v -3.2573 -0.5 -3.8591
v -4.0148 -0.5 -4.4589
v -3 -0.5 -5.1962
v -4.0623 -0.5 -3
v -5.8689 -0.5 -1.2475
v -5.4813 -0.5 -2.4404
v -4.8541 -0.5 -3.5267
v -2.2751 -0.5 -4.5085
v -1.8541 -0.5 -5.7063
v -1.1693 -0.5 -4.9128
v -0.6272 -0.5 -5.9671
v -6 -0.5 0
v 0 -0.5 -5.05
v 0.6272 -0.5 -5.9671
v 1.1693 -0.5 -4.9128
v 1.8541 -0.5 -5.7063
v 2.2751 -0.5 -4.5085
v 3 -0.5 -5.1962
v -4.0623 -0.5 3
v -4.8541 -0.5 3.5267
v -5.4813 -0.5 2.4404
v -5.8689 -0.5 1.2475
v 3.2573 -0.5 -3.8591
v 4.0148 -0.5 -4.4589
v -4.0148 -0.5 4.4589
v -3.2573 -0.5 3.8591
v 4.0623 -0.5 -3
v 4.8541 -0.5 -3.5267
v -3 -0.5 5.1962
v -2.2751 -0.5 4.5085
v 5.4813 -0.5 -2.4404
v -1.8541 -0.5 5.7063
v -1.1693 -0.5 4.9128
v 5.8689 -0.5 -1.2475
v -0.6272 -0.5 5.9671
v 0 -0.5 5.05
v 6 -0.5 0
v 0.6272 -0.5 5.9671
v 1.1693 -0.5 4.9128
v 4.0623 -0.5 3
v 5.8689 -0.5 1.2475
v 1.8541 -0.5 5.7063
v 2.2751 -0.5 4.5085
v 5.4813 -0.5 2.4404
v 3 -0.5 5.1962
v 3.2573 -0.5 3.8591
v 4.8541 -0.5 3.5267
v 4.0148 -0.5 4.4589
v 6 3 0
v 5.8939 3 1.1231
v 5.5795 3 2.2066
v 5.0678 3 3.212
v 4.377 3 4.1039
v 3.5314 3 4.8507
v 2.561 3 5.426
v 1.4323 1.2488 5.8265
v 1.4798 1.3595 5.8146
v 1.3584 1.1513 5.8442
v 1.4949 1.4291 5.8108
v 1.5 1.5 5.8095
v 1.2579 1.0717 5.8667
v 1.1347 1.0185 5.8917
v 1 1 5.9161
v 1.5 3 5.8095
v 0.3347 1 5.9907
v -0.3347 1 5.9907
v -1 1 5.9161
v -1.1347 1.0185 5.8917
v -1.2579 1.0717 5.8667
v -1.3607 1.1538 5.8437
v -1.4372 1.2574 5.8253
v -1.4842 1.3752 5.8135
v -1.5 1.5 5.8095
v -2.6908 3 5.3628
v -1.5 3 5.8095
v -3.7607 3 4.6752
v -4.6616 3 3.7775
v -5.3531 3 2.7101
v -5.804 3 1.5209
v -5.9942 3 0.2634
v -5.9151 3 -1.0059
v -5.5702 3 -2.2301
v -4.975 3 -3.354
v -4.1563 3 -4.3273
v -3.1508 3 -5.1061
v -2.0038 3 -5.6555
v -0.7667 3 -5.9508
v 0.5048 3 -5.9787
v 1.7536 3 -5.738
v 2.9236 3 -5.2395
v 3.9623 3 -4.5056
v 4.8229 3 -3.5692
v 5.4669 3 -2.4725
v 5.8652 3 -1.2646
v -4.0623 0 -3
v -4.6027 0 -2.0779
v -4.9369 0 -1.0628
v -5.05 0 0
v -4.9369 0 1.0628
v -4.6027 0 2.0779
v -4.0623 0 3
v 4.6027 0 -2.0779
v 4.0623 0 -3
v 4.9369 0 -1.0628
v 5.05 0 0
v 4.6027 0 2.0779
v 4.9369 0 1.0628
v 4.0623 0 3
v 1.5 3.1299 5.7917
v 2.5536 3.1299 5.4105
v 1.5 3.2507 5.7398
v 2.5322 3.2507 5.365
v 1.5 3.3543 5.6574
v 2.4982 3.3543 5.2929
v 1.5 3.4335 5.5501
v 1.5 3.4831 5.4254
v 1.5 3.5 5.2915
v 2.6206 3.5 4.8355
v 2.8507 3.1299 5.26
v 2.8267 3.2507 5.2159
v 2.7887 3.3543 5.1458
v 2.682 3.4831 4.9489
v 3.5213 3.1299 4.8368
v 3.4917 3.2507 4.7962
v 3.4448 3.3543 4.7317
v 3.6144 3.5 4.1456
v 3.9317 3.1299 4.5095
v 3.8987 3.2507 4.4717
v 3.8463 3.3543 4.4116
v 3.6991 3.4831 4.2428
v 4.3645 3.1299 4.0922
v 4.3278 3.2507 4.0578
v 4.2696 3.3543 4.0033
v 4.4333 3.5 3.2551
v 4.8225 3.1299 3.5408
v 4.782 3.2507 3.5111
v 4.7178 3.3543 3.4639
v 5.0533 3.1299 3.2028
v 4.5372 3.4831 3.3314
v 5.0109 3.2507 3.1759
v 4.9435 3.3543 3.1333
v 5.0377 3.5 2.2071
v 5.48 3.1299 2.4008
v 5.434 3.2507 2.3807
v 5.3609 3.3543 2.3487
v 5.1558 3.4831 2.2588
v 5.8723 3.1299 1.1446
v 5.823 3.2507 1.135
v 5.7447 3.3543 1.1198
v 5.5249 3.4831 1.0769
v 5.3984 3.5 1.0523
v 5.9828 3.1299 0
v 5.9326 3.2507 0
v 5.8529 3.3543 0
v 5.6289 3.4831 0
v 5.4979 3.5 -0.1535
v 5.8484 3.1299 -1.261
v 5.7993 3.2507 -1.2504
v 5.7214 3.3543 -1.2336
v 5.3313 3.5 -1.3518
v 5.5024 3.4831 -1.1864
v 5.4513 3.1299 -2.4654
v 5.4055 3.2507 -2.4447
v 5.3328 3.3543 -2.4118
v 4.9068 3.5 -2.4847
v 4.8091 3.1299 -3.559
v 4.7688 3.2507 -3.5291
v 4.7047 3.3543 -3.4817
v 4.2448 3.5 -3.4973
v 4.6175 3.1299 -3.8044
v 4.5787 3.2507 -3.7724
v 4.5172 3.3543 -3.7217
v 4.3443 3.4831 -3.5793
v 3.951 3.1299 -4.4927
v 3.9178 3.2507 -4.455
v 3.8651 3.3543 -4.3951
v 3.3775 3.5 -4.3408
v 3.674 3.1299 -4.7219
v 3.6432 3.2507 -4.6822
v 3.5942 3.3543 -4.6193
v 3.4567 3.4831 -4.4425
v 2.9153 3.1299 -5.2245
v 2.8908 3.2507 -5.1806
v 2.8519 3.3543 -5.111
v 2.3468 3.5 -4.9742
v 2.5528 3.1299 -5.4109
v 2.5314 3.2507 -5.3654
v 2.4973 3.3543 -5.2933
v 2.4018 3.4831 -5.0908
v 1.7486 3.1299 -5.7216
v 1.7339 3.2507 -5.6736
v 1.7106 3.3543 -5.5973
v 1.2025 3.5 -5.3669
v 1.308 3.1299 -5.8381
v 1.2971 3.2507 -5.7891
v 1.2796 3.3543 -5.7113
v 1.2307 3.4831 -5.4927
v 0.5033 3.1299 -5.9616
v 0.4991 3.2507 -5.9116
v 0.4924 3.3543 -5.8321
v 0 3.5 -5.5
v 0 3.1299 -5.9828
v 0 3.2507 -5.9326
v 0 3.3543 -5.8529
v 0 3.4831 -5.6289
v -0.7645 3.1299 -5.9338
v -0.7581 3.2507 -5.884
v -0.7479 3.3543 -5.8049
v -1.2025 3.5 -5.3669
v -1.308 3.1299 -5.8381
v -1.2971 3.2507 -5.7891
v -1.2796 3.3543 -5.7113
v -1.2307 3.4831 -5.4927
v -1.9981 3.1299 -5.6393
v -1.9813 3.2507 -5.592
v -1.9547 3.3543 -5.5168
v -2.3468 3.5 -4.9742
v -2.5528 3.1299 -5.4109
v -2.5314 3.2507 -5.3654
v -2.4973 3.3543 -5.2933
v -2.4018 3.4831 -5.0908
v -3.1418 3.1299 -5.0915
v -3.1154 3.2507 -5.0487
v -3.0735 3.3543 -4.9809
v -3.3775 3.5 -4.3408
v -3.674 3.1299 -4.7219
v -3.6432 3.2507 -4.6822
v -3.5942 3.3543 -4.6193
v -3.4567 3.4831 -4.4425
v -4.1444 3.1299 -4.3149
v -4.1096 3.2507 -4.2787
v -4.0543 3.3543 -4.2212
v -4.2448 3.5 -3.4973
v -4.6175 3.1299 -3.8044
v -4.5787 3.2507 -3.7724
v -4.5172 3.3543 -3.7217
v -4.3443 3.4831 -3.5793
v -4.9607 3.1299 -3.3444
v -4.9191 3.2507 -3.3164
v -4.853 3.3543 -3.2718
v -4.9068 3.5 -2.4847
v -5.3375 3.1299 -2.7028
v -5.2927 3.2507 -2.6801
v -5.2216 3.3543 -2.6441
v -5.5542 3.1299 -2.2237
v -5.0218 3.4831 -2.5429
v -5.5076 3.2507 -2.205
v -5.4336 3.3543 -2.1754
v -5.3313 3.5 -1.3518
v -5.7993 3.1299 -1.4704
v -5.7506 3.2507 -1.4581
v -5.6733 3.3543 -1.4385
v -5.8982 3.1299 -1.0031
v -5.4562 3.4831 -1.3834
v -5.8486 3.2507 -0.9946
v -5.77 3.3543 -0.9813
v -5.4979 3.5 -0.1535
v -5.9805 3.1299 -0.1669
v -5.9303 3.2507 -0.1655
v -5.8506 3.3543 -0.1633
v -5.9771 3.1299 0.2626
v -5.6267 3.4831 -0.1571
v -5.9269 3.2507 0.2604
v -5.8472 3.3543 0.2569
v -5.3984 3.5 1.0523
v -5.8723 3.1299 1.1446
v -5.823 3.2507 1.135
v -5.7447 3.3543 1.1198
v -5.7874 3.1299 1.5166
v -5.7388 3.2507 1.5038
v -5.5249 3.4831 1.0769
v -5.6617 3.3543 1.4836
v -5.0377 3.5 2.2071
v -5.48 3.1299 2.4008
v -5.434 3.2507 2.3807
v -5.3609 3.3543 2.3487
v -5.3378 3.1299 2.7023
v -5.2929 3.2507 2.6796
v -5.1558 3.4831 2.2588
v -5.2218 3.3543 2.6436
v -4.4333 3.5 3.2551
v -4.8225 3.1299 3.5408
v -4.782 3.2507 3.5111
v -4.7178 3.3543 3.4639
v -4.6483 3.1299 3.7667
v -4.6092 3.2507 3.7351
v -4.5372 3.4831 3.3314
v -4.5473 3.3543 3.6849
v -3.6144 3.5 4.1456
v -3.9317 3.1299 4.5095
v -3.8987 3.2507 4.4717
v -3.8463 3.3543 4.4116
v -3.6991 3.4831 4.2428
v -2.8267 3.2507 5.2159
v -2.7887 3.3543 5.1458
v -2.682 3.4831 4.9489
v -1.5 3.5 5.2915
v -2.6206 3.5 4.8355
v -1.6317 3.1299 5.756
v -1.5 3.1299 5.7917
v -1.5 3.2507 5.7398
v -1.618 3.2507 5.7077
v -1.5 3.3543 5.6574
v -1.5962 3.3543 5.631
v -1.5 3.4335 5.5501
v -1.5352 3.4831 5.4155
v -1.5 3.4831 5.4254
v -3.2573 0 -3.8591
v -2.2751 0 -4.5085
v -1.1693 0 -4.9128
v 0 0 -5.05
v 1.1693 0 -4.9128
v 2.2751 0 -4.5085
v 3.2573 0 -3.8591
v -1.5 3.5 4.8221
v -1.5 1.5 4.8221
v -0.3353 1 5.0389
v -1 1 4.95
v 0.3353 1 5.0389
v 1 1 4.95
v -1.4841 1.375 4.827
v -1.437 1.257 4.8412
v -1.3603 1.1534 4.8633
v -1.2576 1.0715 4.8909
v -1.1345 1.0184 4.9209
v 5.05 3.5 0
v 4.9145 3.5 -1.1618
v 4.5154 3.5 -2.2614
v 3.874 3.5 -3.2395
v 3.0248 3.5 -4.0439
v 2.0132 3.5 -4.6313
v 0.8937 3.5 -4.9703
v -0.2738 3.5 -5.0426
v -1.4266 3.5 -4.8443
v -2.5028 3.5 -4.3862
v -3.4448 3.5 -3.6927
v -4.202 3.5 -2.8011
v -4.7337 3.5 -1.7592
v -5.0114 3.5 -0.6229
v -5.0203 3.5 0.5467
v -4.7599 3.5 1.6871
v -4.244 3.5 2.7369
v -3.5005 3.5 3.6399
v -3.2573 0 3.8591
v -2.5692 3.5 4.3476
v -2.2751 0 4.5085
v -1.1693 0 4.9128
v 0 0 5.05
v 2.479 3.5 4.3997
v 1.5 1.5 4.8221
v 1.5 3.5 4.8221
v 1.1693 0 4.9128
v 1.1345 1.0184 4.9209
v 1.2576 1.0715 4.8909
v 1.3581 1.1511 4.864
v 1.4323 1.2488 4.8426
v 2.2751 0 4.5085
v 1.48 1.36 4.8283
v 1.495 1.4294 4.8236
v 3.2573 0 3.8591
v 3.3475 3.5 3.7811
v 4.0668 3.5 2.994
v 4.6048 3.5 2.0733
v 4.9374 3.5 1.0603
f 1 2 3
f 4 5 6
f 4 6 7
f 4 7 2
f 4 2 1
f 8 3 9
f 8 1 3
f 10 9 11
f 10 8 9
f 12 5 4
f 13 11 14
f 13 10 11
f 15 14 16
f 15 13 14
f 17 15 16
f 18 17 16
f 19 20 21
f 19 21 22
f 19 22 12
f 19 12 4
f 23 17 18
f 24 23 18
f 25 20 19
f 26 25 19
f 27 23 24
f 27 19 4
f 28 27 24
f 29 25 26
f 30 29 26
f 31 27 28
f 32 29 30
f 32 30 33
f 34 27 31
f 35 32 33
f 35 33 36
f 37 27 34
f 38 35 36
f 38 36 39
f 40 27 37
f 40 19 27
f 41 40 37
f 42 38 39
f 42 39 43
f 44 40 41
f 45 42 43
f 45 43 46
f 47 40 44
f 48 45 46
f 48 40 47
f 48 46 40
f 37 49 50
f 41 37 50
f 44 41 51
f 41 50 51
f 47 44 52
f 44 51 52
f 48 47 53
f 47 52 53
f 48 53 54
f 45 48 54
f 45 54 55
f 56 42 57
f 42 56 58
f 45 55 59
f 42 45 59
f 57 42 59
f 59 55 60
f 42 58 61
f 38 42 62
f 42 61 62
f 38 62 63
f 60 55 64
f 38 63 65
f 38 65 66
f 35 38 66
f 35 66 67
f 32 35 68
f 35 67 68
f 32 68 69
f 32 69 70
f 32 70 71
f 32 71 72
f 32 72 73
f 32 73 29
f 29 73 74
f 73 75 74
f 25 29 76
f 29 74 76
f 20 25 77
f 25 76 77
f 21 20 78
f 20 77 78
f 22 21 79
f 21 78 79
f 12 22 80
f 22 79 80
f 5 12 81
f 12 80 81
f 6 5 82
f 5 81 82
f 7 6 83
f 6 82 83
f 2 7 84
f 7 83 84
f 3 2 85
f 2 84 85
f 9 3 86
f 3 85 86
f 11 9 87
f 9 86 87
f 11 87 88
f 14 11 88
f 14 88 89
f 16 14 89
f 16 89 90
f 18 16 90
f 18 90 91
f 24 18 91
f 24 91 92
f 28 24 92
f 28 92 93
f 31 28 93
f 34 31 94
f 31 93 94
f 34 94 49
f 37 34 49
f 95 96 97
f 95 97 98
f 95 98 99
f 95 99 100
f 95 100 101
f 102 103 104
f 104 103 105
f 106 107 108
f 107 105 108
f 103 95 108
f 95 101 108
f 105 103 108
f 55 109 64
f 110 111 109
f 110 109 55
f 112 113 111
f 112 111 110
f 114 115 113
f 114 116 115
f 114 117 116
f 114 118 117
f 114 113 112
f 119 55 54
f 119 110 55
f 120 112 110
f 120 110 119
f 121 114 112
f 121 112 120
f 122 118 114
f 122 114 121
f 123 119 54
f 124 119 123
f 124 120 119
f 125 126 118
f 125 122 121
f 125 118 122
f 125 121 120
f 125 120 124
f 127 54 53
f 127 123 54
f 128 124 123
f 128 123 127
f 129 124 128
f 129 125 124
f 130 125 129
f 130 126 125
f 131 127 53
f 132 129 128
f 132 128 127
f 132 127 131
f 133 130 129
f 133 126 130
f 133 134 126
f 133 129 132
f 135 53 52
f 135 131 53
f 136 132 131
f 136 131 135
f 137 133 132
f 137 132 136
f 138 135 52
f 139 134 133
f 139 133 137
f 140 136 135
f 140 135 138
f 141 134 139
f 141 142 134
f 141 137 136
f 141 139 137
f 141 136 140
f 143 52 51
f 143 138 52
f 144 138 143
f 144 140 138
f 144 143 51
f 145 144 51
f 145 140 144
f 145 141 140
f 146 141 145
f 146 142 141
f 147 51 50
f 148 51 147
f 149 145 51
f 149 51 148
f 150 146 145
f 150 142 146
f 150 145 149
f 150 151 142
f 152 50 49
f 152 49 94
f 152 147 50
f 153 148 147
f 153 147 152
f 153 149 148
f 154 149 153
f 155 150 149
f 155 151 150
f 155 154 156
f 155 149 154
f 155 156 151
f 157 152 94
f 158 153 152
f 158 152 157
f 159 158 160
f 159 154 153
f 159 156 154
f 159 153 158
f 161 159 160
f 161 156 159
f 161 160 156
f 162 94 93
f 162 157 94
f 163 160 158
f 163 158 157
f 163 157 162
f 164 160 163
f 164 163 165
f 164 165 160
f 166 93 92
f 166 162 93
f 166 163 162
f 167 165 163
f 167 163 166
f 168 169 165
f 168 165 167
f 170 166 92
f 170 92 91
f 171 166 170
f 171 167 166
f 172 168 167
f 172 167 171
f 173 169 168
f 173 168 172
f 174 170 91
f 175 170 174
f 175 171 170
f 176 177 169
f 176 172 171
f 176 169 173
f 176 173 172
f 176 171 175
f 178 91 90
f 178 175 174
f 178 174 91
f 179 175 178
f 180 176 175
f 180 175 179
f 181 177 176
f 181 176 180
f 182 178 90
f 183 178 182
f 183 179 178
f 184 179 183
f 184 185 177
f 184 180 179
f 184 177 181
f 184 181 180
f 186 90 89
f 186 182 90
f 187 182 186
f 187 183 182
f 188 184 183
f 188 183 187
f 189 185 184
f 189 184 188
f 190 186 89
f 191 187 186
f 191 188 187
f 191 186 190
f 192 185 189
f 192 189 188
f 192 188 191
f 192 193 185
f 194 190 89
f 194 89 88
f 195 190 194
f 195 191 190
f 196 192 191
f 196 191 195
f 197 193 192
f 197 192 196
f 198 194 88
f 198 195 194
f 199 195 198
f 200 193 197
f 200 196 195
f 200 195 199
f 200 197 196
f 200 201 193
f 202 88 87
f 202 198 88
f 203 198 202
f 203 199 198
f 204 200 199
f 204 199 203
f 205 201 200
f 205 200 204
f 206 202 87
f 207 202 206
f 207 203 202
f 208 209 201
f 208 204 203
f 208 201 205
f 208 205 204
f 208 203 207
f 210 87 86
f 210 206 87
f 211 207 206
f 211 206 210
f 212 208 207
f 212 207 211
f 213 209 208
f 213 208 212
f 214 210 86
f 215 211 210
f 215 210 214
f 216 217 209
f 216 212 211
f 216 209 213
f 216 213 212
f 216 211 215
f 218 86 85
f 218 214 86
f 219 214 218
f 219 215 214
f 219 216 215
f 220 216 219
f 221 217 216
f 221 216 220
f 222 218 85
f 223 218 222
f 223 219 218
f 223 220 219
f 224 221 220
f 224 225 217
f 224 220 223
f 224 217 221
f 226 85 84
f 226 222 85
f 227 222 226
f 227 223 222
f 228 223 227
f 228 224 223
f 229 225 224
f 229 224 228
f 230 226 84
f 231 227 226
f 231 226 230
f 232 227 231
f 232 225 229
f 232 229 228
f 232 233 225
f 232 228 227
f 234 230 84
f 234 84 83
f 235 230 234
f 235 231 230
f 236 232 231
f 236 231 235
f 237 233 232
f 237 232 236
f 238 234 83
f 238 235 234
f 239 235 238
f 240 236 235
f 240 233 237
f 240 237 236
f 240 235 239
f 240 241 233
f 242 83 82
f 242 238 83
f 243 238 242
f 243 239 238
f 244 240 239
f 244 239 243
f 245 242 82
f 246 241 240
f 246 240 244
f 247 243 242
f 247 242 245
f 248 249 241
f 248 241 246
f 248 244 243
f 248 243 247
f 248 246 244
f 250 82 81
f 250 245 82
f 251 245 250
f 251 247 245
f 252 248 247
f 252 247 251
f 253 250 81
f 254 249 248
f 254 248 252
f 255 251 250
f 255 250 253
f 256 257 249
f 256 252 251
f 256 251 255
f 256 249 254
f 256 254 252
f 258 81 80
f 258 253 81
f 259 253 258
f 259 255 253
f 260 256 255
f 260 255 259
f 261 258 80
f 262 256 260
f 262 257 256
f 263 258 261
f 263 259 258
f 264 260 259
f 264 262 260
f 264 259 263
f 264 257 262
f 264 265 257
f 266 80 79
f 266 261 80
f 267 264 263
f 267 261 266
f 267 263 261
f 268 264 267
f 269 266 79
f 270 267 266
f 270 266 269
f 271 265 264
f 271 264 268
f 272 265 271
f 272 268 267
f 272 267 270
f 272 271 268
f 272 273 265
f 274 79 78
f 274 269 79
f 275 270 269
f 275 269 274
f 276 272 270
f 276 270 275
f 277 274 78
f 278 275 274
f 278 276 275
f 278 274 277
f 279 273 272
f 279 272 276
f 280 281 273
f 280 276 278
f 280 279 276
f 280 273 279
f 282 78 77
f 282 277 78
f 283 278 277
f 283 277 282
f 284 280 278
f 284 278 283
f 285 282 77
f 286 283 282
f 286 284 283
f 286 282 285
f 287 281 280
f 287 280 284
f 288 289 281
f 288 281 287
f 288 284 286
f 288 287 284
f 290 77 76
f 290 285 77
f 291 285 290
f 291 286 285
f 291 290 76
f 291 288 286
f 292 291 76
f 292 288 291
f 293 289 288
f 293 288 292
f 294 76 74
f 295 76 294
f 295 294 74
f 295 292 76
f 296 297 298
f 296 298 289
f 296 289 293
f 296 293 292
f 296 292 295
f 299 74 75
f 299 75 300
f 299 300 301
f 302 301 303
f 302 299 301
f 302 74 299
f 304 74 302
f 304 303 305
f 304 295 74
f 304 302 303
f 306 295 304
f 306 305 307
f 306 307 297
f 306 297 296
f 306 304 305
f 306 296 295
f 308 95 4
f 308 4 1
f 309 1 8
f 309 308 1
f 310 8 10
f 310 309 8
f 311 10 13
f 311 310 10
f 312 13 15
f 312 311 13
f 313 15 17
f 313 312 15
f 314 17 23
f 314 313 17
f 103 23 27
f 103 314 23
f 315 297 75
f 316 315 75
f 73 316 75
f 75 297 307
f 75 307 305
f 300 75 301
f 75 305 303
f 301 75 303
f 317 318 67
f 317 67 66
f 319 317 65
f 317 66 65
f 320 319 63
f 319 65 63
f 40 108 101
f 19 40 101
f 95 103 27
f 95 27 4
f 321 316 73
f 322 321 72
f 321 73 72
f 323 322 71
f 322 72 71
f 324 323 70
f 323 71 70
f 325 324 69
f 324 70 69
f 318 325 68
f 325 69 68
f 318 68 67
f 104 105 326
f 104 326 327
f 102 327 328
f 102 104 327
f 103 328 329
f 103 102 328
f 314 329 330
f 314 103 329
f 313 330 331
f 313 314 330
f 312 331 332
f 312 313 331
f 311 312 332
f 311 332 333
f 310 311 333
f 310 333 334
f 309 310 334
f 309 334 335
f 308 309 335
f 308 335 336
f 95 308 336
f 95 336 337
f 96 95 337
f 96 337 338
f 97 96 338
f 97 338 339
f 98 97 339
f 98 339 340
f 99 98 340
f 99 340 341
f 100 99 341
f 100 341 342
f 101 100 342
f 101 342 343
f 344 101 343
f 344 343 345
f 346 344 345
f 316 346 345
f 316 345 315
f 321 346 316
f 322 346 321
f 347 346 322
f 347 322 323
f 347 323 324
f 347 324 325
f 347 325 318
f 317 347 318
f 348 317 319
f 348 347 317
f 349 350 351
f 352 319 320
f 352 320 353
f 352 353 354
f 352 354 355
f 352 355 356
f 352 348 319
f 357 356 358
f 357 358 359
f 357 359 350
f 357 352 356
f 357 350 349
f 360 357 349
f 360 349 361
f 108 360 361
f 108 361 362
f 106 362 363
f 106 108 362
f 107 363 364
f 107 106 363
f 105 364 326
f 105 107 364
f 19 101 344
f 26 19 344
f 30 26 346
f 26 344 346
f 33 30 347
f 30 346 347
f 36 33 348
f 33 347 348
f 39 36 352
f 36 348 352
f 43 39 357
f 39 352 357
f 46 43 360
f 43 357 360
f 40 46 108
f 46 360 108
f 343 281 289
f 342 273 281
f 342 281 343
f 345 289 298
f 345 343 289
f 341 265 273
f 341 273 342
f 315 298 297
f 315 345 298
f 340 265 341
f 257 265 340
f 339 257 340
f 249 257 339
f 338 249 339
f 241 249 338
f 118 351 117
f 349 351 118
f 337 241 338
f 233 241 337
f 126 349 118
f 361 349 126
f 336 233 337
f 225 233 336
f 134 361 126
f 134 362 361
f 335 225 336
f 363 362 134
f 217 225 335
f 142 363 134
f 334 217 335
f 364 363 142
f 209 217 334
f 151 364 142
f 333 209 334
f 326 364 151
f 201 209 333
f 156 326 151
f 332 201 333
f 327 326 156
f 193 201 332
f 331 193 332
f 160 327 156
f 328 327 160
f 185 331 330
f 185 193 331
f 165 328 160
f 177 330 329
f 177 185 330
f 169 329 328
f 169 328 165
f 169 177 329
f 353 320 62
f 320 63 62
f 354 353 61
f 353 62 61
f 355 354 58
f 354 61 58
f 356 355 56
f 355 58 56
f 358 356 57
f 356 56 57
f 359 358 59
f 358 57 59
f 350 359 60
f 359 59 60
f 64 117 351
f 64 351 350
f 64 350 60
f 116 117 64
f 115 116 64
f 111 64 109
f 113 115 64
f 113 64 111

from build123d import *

# Parameters (mm, degrees)
SKETCH1_R           = 6
SKETCH1_R_2         = 5.05
BOSS_EXTRUDE1_DEPTH = 3.5
SKETCH4_R           = 6
BOSS_EXTRUDE2_DEPTH = 0.5
SKETCH5_W           = 3
SKETCH5_H           = 1.177915389
CUT_EXTRUDE3_DEPTH  = 2.5
CUT_EXTRUDE4_DEPTH  = 1.5
FILLET1_R           = 0.5


with BuildPart() as part:
    # Sketch1 → Boss-Extrude1 (new body)
    with BuildSketch(Plane(origin=(0, 0, 0), x_dir=(1, 0, 0), z_dir=(0, 1, 0))):
        Circle(SKETCH1_R)
        Circle(SKETCH1_R_2, mode=Mode.SUBTRACT)
    extrude(amount=BOSS_EXTRUDE1_DEPTH)

    # Sketch4 → Boss-Extrude2 (add)
    with BuildSketch(Plane.XZ):
        Circle(SKETCH4_R)
    extrude(amount=BOSS_EXTRUDE2_DEPTH)

    # Sketch5 → Cut-Extrude3 (cut)
    with BuildSketch(Plane.XZ.offset(-3.5)):
        with Locations((0, 5.411042306)):
            Rectangle(SKETCH5_W, SKETCH5_H)
    extrude(amount=CUT_EXTRUDE3_DEPTH, mode=Mode.SUBTRACT)

    # Sketch7 → Cut-Extrude4 (cut, through all)
    with BuildSketch(Plane(origin=(0, 0, 0), x_dir=(1, 0, 0), z_dir=(0, 1, 0))):
        with BuildLine():
            Line((4.062326919, -3), (-4.062326919, -3))
            ThreePointArc((-4.062326919, -3), (0, -5.05), (4.062326919, -3))
        make_face()
        with BuildLine():
            Line((4.062326919, 3), (-4.062326919, 3))
            ThreePointArc((-4.062326919, 3), (0, 5.05), (4.062326919, 3))
        make_face()
    extrude(amount=-CUT_EXTRUDE4_DEPTH, mode=Mode.SUBTRACT)

    # Fillet1
    fillet1_edges = [part.edges().sort_by_distance(p)[0] for p in [
        (-3.674234614, 3.5, -4.74341649),
        (-1.5, 1, 5.315779815),
        (1.5, 1, 5.315779815),
    ]]
    fillet(fillet1_edges, radius=FILLET1_R)


solid = part.part
